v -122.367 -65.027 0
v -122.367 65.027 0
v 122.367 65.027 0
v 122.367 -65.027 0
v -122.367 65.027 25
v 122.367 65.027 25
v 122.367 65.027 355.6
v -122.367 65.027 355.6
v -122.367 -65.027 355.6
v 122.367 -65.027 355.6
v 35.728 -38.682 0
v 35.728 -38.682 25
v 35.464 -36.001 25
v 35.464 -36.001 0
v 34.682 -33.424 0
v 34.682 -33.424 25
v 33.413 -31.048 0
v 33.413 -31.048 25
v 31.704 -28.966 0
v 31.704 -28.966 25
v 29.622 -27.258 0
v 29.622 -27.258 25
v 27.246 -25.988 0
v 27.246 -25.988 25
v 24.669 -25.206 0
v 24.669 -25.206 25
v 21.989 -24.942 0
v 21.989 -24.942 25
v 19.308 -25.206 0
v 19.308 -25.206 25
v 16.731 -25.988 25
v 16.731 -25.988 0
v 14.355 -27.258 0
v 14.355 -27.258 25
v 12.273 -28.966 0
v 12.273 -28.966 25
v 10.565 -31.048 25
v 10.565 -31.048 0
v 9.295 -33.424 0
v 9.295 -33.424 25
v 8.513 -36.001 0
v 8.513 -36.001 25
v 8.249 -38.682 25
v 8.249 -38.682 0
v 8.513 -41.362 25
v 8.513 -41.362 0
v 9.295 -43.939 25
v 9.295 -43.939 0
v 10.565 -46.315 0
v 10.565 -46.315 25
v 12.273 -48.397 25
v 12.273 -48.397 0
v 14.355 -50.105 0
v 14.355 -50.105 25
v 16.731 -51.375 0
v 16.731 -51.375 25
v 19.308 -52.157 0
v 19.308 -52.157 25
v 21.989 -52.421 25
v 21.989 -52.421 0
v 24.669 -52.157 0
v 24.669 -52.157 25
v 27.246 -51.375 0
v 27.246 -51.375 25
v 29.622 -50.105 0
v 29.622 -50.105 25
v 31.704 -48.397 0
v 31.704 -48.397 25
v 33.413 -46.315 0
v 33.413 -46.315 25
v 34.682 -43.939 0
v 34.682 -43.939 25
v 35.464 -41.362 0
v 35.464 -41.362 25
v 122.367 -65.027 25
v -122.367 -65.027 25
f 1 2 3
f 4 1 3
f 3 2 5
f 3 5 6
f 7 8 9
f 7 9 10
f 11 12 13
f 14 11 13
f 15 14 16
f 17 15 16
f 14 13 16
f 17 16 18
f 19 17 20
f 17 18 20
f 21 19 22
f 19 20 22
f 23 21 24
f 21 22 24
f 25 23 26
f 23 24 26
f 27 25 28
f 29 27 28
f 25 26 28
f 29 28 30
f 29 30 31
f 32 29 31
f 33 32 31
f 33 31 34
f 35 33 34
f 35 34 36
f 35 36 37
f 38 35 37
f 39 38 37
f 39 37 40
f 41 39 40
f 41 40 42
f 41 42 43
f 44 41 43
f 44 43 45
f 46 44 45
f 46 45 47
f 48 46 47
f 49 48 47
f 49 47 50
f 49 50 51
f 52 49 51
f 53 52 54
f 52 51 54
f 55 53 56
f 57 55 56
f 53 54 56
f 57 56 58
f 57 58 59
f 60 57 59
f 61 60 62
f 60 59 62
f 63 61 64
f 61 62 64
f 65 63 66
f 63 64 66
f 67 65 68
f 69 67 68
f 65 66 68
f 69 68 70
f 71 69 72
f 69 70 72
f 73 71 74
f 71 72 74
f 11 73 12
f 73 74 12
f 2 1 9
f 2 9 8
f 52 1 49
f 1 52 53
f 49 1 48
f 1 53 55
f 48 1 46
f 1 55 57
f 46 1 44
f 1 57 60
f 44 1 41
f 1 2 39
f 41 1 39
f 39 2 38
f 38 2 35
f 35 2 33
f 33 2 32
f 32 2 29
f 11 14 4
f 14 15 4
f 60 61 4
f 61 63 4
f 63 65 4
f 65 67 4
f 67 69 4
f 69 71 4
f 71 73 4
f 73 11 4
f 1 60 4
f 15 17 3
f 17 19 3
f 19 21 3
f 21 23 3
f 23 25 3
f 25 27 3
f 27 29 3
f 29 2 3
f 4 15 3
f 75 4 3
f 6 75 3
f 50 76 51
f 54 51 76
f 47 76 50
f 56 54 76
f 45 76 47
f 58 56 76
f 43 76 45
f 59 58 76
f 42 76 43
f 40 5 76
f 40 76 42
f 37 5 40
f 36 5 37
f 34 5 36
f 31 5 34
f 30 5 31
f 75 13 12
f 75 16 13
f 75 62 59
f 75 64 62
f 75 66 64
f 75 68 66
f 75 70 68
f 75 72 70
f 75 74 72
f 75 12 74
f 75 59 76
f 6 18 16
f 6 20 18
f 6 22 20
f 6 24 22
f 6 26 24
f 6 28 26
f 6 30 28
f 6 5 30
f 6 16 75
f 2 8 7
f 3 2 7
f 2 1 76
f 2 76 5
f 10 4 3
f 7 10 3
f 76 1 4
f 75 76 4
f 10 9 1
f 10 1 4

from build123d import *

# Parameters (mm, degrees)
F0_W     = 244.733572
F0_H     = 130.053326
F1_DEPTH = 25
F2_R     = 19.389288
F3_DEPTH = 25
F4_R     = 13.739414
F5_DEPTH = 25.24714
F6_DEPTH = 355.6


with BuildPart() as f1:
    # F0 (on Top) → F1 (new body)
    with BuildSketch(Plane.XY):
        Rectangle(F0_W, F0_H)
    extrude(amount=F1_DEPTH)

    # F2 (on face) → F3 (join)
    with BuildSketch(Plane.XY.offset(25)):
        with Locations((22.206802, -37.867222)):
            Circle(F2_R)
    extrude(amount=-F3_DEPTH)

    # F4 (on face) → F5 (cut)
    with BuildSketch(Plane.XY.offset(25)):
        with Locations((21.988617, -38.681503)):
            Circle(F4_R)
    extrude(amount=-F5_DEPTH, mode=Mode.SUBTRACT)


with BuildPart() as f6:
    # F0 (on Top) → F6 (new body)
    with BuildSketch(Plane.XY):
        Rectangle(F0_W, F0_H)
    extrude(amount=F6_DEPTH)


solid = Compound([f1.part, f6.part])
